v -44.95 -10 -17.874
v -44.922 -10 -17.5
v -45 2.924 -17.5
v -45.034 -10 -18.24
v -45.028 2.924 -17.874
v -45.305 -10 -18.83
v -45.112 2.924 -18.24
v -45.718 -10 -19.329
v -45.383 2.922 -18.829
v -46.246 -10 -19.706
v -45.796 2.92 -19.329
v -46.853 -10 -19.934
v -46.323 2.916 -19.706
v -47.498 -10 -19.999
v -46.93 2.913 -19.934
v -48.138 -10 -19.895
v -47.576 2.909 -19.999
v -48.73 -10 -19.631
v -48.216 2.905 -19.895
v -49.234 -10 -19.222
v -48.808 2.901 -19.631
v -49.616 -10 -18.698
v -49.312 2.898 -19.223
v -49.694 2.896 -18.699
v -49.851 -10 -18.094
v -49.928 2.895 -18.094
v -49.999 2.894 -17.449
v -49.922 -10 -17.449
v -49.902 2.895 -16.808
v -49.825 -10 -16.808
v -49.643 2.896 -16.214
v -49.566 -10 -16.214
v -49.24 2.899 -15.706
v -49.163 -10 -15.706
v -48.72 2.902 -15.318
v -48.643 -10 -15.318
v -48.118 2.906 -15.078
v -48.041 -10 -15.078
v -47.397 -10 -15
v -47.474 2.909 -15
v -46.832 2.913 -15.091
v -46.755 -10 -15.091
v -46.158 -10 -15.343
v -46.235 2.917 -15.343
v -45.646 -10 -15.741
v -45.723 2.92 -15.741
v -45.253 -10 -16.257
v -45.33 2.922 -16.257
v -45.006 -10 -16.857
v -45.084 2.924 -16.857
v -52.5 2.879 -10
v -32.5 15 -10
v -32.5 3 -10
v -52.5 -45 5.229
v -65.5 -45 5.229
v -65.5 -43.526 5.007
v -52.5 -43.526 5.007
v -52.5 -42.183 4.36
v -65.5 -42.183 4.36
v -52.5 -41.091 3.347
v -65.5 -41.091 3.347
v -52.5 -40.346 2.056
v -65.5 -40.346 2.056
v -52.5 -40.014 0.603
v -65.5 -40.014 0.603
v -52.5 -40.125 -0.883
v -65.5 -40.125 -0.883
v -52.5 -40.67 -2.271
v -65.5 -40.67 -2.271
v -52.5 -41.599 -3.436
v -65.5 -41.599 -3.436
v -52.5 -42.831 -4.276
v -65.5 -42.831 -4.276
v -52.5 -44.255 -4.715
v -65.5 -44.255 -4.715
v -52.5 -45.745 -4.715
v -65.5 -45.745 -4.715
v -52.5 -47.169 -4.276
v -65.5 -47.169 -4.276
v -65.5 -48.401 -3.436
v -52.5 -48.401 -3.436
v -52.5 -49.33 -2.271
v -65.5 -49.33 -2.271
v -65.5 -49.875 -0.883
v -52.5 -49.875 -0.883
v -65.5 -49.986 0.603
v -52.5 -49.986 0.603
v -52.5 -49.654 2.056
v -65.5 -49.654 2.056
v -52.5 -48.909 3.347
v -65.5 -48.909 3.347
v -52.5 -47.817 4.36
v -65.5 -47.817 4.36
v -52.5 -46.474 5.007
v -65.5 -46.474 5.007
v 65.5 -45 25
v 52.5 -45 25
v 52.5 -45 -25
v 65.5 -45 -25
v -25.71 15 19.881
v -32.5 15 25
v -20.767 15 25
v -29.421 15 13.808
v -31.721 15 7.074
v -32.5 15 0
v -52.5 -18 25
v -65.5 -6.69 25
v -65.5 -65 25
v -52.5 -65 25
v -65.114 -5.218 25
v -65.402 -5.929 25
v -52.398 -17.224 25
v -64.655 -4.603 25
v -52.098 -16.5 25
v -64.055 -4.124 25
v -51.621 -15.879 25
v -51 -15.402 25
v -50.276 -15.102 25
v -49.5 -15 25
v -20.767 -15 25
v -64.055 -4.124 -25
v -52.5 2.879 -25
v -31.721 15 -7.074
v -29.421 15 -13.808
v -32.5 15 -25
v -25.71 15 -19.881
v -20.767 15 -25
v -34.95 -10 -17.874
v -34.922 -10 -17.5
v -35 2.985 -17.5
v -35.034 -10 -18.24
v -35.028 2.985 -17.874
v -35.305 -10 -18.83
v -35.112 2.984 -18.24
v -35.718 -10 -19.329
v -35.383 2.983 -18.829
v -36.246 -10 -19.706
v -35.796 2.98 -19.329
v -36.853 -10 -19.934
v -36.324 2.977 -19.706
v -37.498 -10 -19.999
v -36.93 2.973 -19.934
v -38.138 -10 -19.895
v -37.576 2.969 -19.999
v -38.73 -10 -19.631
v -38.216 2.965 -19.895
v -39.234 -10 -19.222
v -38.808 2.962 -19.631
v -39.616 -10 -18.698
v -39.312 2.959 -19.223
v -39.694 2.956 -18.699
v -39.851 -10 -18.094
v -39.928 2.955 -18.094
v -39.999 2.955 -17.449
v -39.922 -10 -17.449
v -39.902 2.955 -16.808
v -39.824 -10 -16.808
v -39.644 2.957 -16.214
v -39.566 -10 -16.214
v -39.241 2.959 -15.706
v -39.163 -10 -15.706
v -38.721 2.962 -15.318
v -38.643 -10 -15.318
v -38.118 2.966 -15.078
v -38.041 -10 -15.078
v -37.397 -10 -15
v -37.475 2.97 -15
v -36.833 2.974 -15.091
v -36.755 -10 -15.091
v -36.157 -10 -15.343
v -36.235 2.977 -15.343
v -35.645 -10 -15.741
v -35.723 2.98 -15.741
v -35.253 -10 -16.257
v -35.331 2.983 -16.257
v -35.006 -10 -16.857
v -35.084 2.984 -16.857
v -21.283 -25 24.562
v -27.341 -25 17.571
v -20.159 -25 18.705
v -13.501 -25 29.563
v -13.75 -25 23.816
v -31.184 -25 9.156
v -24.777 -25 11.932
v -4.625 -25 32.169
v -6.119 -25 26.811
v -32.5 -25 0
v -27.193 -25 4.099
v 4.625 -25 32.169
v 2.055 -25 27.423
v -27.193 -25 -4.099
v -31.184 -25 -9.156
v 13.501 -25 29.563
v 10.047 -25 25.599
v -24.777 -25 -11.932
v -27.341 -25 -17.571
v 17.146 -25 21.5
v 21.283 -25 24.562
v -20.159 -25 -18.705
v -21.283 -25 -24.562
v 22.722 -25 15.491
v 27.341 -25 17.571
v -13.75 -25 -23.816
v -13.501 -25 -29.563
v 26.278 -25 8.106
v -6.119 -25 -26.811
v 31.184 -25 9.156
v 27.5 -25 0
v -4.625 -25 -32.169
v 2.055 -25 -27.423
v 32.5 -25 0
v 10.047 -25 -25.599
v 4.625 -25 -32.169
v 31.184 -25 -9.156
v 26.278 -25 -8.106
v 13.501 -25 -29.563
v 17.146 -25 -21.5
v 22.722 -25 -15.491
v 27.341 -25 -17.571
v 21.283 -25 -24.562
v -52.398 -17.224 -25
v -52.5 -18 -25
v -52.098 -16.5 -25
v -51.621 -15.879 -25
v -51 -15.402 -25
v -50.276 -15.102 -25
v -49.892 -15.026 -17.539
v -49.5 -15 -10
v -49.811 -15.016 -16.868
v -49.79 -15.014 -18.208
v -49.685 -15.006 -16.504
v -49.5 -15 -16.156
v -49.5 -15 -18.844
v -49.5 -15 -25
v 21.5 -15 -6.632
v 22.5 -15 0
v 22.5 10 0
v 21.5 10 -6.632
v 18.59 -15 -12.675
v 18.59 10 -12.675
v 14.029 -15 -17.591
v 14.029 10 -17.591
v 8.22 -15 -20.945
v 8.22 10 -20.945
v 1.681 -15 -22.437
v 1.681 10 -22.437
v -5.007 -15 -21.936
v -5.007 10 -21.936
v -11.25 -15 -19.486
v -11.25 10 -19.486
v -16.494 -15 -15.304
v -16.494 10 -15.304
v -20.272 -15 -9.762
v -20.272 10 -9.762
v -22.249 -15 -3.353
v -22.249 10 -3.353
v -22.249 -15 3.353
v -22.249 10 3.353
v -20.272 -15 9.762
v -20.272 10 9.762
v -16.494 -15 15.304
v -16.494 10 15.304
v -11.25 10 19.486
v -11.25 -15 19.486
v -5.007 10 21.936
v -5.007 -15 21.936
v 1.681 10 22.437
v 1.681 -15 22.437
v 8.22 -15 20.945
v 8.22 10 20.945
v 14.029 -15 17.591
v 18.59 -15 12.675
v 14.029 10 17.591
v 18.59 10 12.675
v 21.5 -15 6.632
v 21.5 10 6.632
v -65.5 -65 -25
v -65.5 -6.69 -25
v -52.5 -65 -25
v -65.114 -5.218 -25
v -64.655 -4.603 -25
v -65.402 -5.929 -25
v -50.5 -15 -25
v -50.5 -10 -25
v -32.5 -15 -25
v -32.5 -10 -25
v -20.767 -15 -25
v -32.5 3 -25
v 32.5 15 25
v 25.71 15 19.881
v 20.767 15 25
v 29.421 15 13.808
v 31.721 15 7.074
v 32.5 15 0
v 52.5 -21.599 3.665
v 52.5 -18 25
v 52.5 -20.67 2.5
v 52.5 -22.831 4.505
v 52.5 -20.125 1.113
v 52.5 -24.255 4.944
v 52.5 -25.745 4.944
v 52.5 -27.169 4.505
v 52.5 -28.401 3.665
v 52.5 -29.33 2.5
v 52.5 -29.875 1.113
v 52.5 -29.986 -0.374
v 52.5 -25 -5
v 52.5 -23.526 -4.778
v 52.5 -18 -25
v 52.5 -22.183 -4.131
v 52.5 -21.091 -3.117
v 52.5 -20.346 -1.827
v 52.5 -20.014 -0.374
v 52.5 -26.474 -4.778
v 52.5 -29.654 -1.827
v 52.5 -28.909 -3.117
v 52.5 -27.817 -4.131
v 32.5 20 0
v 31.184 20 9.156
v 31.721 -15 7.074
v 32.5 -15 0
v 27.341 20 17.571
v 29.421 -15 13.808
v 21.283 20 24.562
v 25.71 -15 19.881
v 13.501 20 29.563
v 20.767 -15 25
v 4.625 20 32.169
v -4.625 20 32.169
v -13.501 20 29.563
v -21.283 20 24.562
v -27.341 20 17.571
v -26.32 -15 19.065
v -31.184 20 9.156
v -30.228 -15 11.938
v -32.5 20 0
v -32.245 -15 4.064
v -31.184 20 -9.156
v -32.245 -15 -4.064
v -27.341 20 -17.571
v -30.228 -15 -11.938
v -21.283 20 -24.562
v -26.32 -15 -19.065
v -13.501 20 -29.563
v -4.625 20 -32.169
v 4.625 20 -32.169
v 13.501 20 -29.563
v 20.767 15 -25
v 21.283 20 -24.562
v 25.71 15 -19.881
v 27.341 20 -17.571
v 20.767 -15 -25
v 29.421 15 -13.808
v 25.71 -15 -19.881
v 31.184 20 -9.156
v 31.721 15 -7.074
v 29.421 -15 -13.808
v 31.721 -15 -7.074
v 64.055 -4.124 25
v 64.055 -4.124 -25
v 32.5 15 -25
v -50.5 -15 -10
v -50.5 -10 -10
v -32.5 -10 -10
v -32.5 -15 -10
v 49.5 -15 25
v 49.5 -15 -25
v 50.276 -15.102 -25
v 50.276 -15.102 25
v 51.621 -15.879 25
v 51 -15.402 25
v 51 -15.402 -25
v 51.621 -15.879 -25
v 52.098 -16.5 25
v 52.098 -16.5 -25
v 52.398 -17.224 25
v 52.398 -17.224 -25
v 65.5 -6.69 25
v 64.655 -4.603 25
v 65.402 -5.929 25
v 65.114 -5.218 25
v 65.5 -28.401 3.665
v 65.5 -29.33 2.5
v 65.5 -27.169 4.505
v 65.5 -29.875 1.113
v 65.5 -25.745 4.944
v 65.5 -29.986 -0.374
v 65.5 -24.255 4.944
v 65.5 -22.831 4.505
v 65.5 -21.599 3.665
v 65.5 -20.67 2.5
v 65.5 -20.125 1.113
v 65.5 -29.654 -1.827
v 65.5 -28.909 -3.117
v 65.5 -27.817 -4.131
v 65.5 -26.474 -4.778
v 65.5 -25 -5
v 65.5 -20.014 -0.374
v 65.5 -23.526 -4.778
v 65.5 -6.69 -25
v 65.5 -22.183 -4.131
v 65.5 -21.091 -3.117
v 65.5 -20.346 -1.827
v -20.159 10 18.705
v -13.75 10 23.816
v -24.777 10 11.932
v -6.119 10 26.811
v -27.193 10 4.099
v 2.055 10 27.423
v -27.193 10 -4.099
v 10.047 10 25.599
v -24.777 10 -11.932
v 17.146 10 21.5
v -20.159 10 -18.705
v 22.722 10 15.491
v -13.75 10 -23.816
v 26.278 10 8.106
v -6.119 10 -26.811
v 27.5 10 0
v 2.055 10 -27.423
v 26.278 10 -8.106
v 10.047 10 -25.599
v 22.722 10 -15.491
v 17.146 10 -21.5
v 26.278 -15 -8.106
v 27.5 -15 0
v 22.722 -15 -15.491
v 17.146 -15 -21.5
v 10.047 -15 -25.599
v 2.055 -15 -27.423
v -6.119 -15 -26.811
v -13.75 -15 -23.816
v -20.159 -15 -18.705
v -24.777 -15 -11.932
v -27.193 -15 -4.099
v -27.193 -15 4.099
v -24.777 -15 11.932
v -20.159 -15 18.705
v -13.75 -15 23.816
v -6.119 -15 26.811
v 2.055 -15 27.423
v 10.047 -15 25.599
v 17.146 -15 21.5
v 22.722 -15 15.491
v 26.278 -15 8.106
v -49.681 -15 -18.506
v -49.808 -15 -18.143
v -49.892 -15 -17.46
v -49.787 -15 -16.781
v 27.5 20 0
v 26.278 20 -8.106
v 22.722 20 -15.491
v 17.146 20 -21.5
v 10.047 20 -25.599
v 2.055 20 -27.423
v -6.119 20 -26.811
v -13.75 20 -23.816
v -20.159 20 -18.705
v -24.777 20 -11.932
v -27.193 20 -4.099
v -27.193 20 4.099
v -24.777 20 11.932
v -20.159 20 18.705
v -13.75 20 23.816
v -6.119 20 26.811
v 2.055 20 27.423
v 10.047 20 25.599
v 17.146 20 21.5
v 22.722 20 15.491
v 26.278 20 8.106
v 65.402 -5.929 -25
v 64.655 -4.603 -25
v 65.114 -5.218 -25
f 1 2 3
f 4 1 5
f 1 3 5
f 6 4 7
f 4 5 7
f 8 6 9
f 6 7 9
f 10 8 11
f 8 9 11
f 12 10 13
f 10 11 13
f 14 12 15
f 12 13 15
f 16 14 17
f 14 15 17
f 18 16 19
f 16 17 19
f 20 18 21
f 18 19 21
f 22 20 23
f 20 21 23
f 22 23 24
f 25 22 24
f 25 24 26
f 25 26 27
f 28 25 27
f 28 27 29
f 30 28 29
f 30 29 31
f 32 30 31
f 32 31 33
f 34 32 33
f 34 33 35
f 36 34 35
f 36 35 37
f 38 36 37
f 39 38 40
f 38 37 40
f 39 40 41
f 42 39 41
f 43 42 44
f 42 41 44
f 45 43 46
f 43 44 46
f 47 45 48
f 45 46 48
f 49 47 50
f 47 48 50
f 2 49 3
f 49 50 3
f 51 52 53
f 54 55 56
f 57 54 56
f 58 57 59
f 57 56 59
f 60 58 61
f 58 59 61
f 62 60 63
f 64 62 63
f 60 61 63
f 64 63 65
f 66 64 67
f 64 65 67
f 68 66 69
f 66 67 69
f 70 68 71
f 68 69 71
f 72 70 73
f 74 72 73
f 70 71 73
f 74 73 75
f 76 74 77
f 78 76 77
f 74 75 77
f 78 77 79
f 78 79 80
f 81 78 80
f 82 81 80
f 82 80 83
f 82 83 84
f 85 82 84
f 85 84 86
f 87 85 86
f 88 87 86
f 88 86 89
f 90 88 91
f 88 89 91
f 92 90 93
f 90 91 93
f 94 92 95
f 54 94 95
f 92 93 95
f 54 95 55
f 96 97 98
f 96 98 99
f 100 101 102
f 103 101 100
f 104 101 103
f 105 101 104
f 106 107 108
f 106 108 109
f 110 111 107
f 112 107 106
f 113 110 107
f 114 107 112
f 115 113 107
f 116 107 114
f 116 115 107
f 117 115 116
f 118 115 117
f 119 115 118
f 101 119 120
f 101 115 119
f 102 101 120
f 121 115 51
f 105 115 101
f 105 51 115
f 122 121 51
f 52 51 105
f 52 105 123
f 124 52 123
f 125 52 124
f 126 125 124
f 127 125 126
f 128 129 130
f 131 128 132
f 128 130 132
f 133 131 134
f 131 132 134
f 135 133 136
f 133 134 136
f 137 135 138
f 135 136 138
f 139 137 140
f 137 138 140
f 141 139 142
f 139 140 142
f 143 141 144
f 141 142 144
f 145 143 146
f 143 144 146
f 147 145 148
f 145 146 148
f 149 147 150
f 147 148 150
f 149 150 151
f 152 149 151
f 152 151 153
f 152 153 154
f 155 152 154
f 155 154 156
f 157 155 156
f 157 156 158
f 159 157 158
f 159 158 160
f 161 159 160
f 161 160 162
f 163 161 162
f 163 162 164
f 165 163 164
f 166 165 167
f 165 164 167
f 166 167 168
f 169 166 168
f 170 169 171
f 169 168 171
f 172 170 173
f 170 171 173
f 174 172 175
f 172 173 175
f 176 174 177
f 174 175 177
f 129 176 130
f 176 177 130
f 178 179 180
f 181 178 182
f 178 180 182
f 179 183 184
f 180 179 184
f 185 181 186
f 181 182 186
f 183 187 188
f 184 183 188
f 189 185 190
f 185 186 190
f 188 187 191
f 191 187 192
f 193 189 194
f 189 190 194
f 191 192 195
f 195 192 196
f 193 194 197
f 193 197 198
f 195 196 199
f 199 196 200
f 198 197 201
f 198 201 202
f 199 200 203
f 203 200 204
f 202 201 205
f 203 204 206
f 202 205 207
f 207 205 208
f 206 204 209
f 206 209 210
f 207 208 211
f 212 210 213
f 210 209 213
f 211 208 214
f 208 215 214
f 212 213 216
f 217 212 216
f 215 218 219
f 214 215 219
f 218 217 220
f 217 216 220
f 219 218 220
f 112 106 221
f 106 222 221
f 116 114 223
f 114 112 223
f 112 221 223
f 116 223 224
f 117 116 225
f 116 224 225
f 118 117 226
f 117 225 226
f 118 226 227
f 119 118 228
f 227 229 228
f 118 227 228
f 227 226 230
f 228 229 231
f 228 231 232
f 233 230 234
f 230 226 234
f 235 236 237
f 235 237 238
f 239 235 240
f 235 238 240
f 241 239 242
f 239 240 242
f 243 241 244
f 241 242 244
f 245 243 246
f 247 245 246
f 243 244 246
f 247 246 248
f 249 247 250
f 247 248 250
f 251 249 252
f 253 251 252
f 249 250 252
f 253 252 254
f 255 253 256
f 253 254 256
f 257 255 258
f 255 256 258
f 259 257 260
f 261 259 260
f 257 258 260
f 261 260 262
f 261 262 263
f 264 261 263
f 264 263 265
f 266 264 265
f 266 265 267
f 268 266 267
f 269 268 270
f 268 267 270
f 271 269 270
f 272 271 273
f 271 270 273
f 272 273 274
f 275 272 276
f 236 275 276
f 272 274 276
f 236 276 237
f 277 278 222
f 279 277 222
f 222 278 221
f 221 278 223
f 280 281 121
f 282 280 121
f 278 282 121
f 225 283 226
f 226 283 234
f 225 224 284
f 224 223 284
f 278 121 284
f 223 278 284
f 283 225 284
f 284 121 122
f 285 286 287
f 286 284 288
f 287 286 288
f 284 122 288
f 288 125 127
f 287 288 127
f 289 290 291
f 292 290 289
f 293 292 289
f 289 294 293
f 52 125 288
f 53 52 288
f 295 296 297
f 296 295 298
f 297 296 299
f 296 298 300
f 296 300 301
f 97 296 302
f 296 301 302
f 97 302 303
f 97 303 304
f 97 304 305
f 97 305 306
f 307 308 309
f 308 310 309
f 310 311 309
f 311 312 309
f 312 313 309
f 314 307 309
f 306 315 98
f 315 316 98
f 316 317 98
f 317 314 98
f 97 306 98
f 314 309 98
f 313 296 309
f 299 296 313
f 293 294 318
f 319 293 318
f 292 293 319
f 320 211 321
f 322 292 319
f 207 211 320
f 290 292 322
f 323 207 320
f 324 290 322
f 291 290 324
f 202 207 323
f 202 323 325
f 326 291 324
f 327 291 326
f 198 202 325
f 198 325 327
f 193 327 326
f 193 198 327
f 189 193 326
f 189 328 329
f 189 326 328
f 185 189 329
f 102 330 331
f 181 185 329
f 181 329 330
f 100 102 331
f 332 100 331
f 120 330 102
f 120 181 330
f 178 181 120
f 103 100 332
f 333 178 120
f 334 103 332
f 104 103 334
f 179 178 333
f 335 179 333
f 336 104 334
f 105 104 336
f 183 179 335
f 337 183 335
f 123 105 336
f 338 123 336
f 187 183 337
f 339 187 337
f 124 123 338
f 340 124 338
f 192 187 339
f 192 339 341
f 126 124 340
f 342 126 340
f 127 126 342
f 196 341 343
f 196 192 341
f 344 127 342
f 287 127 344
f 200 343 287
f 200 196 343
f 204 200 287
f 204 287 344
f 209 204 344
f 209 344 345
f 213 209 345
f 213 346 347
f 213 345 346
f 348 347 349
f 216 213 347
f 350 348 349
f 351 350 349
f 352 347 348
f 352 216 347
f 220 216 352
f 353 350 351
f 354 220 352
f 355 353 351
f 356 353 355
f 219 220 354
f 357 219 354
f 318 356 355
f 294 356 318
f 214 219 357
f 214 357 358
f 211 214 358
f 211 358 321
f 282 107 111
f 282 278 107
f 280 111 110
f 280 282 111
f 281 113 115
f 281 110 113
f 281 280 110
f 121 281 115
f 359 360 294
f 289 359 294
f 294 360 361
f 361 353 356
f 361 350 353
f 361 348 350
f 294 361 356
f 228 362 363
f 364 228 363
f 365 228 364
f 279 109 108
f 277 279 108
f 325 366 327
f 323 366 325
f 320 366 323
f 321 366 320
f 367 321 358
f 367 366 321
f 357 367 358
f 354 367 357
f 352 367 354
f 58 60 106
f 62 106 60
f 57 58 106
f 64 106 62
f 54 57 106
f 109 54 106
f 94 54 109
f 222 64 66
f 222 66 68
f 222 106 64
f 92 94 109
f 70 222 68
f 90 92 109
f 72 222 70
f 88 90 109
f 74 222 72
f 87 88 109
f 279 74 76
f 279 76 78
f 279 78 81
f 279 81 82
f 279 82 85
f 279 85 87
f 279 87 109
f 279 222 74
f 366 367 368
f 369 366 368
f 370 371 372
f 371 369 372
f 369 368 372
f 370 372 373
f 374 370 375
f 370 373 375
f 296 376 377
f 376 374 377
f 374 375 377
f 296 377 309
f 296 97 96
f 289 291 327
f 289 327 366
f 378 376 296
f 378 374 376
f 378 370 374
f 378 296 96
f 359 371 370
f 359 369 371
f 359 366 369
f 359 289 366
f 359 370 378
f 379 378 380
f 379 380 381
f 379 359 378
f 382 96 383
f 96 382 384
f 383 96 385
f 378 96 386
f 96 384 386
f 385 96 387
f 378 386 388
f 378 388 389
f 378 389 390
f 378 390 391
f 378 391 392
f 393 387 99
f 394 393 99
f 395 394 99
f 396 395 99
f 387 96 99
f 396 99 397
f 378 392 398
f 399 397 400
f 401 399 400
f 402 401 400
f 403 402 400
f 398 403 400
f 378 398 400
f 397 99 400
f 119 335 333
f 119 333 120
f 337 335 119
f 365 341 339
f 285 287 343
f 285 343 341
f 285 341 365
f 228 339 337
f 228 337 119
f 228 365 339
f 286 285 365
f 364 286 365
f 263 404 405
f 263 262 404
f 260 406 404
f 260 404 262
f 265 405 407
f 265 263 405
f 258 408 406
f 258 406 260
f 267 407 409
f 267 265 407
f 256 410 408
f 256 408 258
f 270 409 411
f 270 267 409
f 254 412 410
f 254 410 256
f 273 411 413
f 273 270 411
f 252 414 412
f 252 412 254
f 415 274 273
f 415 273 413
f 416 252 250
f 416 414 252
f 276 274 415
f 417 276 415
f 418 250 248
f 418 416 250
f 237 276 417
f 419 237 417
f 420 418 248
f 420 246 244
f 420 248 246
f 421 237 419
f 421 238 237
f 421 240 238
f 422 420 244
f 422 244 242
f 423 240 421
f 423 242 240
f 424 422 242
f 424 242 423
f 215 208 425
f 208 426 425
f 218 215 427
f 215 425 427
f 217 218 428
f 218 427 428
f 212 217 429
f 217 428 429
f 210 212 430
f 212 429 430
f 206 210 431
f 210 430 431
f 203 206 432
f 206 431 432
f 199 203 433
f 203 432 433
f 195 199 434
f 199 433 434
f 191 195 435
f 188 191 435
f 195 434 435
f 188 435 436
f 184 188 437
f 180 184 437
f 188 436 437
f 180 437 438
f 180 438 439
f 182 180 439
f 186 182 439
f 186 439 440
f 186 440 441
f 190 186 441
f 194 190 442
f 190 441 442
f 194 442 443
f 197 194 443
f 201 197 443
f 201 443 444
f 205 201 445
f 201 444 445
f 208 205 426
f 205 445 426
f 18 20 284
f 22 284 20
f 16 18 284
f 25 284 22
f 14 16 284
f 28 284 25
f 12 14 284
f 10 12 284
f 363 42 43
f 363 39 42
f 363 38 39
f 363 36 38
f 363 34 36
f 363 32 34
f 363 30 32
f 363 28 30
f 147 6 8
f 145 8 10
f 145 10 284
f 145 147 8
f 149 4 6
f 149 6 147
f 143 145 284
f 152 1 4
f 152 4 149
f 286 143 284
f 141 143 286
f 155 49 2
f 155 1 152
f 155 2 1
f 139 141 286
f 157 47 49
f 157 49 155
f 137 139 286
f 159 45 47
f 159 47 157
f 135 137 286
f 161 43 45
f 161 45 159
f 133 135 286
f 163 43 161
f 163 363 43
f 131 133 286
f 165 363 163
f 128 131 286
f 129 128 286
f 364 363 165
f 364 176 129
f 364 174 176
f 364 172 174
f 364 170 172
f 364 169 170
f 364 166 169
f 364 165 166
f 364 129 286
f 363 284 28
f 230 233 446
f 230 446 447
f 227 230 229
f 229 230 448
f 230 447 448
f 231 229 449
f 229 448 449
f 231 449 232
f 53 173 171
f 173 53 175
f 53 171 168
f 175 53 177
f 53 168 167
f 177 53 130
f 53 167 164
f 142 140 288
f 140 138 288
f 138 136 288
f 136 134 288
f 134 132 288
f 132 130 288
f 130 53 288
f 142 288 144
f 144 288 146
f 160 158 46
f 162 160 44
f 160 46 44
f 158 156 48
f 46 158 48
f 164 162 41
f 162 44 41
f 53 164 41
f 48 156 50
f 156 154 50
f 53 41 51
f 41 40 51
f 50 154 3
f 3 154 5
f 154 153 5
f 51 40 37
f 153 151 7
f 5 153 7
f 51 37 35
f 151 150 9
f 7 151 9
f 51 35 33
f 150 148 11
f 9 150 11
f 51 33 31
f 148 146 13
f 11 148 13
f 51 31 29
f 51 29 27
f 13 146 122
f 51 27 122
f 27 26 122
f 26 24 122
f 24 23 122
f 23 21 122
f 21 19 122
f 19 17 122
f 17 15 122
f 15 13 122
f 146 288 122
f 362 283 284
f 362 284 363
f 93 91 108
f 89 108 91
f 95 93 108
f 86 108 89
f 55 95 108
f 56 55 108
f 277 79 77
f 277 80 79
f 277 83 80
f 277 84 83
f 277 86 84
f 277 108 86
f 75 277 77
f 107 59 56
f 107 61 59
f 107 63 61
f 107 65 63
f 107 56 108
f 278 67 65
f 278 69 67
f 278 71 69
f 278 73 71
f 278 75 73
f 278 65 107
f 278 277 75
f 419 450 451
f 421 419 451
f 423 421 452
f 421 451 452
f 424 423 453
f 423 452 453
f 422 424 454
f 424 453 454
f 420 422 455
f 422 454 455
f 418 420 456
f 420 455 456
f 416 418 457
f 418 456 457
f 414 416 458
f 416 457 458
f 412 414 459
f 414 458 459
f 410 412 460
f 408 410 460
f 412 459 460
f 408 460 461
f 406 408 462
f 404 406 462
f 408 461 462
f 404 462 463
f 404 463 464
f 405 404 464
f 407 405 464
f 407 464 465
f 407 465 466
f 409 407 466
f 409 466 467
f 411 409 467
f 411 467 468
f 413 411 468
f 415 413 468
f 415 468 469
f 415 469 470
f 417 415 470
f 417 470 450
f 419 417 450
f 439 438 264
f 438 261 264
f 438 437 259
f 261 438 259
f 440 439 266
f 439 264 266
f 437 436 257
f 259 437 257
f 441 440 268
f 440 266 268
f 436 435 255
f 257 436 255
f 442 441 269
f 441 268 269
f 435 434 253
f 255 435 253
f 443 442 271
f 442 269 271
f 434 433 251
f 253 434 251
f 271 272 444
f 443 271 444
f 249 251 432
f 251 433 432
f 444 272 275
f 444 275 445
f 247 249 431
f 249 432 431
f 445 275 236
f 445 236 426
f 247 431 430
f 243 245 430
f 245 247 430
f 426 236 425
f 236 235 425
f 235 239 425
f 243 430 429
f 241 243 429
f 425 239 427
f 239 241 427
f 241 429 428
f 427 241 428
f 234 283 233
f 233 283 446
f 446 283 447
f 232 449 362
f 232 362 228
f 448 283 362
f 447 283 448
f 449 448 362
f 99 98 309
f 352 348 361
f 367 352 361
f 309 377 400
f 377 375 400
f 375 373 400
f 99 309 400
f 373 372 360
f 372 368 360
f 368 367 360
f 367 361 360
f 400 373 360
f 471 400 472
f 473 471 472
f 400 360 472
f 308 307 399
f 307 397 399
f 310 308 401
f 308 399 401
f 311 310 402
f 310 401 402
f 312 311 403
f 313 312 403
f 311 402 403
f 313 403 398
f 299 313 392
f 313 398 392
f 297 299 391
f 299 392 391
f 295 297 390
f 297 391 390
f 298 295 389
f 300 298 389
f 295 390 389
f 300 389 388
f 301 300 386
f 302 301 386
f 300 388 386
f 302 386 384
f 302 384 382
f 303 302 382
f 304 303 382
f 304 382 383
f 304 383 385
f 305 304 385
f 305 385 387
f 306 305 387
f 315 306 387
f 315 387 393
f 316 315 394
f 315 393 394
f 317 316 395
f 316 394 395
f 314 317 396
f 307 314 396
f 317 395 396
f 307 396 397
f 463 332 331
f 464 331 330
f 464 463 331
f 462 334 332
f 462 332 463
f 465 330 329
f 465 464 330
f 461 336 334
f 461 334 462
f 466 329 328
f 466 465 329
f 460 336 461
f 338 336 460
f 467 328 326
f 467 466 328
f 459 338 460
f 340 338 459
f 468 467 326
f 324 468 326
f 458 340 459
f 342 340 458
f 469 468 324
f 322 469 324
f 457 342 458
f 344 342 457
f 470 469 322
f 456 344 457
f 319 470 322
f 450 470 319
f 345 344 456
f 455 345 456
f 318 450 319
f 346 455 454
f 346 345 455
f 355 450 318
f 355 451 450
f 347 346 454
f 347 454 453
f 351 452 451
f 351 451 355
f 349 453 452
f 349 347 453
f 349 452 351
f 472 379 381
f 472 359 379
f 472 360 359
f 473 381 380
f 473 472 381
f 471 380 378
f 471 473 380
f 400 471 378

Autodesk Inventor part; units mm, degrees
ref_plane "YZ Plane" through (0, 0, 0) normal (1, 0, 0) x (0, 1, 0)
ref_plane "XZ Plane" through (0, 0, 0) normal (0, 1, 0) x (-1, 0, 0)
sketch "Sketch1" plane through (0, 0, 0) normal (0, 0, 1) x (1, 0, 0)
  line L0 (-32.5, 15) -> (32.5, 15)
  line L1 (32.5, 15) -> (32.5, -15)
  line L2 (-32.5, -15) -> (-32.5, 15)
  line L3 (-32.5, 15) -> (32.5, -15) construction
  line L4 (32.5, 15) -> (-32.5, -15) construction
  line L5 (-22.5, 15) -> (11.5921, 15) construction
  line L6 (-22.5, -15) -> (-49.5, -15)
  line L7 (-52.5, -18) -> (-52.5, -65)
  line L8 (-52.5, -65) -> (-65.5, -65)
  line L9 (-65.5, -65) -> (-65.5, -6.6898)
  line L10 (-64.0549, -4.1242) -> (-32.5, 15)
  arc A0 (-64.0549, -4.1242) -> (-65.5, -6.6898) centre (-62.5, -6.6898) ccw
  arc A1 (-49.5, -15) -> (-52.5, -18) centre (-49.5, -18) ccw
  line L11 (32.5, -15) -> (22.5, -15)
  line L12 (32.5, -15) -> (49.5, -15)
  line L13 (52.5, -18) -> (52.5, -45)
  line L14 (52.5, -45) -> (65.5, -45)
  line L15 (65.5, -45) -> (65.5, -6.6898)
  line L16 (64.0549, -4.1242) -> (32.5, 15)
  arc A2 (65.5, -6.6898) -> (64.0549, -4.1242) centre (62.5, -6.6898) ccw
  arc A3 (52.5, -18) -> (49.5, -15) centre (49.5, -18) ccw
  line L17 (-22.5, -15) -> (22.5, -15)
  point P0 (0, 0)
  point P1 (-22.5, -2.0461)
  point P2 (-52.5, -15)
  point P3 (-65.5, -5)
  point P4 (52.5, -15)
  point P5 (65.5, -5)
  dimension "d0" = 65
  dimension "d1" = 30
  dimension "d3" = 10
  dimension "d4" = 30
  dimension "d5" = 50
  dimension "d6" = 13
  dimension "d7" = 60
  dimension "d8" = 3
  dimension "d10" = 20
  dimension "d11" = 30
  dimension "d12" = 13
  dimension "d13" = 40
  dimension "d14" = 3
extrude "Extrusion1" add sketch "Sketch1" along normal mid plane 50
sketch "Sketch2" plane through (-32.5, 15, 25) normal (0, 1, 0) x (1, 0, 0)
  circle A0 centre (32.5, 25) radius 32.5
  dimension "d17" = 65
extrude "Extrusion2" add sketch "Sketch2" along normal blind 5 and the other way blind 40
sketch "Sketch3" plane through (0, 20, 0) normal (0, 1, 0) x (1, 0, 0)
  circle A0 centre (0, 0) radius 27.5
  dimension "d22" = 55
sketch "Sketch4" plane through (0, 20, 0) normal (0, 1, 0) x (1, 0, 0)
  point P0 (0, 0)
extrude "Extrusion3" cut sketch "Sketch3" against normal through all
ref_plane "Work Plane1" through (0, 10, 0) normal (0, 1, 0) x (1, 0, 0)
sketch "Sketch5" plane through (0, 10, 0) normal (0, 1, 0) x (1, 0, 0)
  circle A0 centre (0, 0) radius 27.5
  circle A1 centre (0, 0) radius 22.5
  dimension "d26" = 55
  dimension "d27" = 45
extrude "Extrusion4" add sketch "Sketch5" against normal blind 25
sketch "Sketch6" plane through (-65.5, -65, 25) normal (-1, 0, 0) x (0, 0, 1)
  circle A0 centre (-24.7708, 20) radius 5
  line L0 (-50, 0) -> (-50, 58.3102) projected
  line L1 (2.5, 40) -> (-52.5, 40) projected
  line L2 (-50, 0) -> (0.2292, 0)
  line L3 (0.2292, 0) -> (0.2292, 40)
  line L4 (0.2292, 40) -> (-50, 40)
  line L5 (-50, 40) -> (-50, 0)
  point P0 (-25, 65)
  dimension "d30" = 10
  dimension "d31" = 20
  dimension "d33" = 25
extrude "Extrusion5" cut sketch "Sketch6" against normal blind 25 contours A0
sketch "Sketch7" plane through (65.5, -45, 25) normal (1, 0, 0) x (0, 0, -1)
  circle A0 centre (25, 20) radius 5
  line L0 (50, 0) -> (0, 0) projected
  line L1 (50, 38.3102) -> (50, 0) projected
  point P0 (25, 45)
  dimension "d36" = 10
  dimension "d37" = 20
  dimension "d38" = 25
extrude "Extrusion6" cut sketch "Sketch7" against normal blind 20
sketch "Sketch8" plane through (0, 0, -25) normal (0, 0, -1) x (-1, 0, 0)
  line L0 (32.5, 15) -> (64.0549, -4.1242) projected
  line L1 (32.5, 15) -> (32.5, 3)
  line L2 (32.5, 3) -> (52.4996, 2.879)
  point P0 (0, 0)
  dimension "d41" = 12
  dimension "d42" = 20
extrude "Extrusion7" cut sketch "Sketch8" against normal blind 15
sketch "Sketch9" plane through (-52.4996, 2.879, -10) normal (-0.006, 1, 0) x (1, 0.006, 0)
  circle A0 centre (5, 7.5) radius 2.5
  circle A1 centre (15, 7.5) radius 2.5
  line L0 (0, 0) -> (0, 15) projected
  line L1 (20.0726, 15) -> (20.0726, 0) projected
  line L2 (0, 15) -> (20, 15) projected
  point P0 (52.4813, -10)
  dimension "d45" = 5
  dimension "d46" = 5
  dimension "d48" = 10
  dimension "d49" = 5
  dimension "d51" = 7.5
  dimension "d52" = 7.5
extrude "Extrusion8" cut sketch "Sketch9" against normal blind 25
sketch "Sketch10" plane through (-49.5, -15, -25) normal (0, -1, 0) x (1, 0, 0)
  line L0 (17, 0) -> (17, 15) projected
  line L1 (-2.9996, 15) -> (17, 15) projected
  line L2 (17, 0) -> (-1, 0)
  line L3 (-1, 0) -> (-1, 15)
  line L4 (-1, 15) -> (17, 15)
  line L5 (17, 15) -> (17, 0)
  point P0 (49.5, 25)
  dimension "d55" = 18
extrude "Extrusion9" cut sketch "Sketch10" against normal blind 5
equation "\"d52\" = d51"
properties part number "upright2025"
